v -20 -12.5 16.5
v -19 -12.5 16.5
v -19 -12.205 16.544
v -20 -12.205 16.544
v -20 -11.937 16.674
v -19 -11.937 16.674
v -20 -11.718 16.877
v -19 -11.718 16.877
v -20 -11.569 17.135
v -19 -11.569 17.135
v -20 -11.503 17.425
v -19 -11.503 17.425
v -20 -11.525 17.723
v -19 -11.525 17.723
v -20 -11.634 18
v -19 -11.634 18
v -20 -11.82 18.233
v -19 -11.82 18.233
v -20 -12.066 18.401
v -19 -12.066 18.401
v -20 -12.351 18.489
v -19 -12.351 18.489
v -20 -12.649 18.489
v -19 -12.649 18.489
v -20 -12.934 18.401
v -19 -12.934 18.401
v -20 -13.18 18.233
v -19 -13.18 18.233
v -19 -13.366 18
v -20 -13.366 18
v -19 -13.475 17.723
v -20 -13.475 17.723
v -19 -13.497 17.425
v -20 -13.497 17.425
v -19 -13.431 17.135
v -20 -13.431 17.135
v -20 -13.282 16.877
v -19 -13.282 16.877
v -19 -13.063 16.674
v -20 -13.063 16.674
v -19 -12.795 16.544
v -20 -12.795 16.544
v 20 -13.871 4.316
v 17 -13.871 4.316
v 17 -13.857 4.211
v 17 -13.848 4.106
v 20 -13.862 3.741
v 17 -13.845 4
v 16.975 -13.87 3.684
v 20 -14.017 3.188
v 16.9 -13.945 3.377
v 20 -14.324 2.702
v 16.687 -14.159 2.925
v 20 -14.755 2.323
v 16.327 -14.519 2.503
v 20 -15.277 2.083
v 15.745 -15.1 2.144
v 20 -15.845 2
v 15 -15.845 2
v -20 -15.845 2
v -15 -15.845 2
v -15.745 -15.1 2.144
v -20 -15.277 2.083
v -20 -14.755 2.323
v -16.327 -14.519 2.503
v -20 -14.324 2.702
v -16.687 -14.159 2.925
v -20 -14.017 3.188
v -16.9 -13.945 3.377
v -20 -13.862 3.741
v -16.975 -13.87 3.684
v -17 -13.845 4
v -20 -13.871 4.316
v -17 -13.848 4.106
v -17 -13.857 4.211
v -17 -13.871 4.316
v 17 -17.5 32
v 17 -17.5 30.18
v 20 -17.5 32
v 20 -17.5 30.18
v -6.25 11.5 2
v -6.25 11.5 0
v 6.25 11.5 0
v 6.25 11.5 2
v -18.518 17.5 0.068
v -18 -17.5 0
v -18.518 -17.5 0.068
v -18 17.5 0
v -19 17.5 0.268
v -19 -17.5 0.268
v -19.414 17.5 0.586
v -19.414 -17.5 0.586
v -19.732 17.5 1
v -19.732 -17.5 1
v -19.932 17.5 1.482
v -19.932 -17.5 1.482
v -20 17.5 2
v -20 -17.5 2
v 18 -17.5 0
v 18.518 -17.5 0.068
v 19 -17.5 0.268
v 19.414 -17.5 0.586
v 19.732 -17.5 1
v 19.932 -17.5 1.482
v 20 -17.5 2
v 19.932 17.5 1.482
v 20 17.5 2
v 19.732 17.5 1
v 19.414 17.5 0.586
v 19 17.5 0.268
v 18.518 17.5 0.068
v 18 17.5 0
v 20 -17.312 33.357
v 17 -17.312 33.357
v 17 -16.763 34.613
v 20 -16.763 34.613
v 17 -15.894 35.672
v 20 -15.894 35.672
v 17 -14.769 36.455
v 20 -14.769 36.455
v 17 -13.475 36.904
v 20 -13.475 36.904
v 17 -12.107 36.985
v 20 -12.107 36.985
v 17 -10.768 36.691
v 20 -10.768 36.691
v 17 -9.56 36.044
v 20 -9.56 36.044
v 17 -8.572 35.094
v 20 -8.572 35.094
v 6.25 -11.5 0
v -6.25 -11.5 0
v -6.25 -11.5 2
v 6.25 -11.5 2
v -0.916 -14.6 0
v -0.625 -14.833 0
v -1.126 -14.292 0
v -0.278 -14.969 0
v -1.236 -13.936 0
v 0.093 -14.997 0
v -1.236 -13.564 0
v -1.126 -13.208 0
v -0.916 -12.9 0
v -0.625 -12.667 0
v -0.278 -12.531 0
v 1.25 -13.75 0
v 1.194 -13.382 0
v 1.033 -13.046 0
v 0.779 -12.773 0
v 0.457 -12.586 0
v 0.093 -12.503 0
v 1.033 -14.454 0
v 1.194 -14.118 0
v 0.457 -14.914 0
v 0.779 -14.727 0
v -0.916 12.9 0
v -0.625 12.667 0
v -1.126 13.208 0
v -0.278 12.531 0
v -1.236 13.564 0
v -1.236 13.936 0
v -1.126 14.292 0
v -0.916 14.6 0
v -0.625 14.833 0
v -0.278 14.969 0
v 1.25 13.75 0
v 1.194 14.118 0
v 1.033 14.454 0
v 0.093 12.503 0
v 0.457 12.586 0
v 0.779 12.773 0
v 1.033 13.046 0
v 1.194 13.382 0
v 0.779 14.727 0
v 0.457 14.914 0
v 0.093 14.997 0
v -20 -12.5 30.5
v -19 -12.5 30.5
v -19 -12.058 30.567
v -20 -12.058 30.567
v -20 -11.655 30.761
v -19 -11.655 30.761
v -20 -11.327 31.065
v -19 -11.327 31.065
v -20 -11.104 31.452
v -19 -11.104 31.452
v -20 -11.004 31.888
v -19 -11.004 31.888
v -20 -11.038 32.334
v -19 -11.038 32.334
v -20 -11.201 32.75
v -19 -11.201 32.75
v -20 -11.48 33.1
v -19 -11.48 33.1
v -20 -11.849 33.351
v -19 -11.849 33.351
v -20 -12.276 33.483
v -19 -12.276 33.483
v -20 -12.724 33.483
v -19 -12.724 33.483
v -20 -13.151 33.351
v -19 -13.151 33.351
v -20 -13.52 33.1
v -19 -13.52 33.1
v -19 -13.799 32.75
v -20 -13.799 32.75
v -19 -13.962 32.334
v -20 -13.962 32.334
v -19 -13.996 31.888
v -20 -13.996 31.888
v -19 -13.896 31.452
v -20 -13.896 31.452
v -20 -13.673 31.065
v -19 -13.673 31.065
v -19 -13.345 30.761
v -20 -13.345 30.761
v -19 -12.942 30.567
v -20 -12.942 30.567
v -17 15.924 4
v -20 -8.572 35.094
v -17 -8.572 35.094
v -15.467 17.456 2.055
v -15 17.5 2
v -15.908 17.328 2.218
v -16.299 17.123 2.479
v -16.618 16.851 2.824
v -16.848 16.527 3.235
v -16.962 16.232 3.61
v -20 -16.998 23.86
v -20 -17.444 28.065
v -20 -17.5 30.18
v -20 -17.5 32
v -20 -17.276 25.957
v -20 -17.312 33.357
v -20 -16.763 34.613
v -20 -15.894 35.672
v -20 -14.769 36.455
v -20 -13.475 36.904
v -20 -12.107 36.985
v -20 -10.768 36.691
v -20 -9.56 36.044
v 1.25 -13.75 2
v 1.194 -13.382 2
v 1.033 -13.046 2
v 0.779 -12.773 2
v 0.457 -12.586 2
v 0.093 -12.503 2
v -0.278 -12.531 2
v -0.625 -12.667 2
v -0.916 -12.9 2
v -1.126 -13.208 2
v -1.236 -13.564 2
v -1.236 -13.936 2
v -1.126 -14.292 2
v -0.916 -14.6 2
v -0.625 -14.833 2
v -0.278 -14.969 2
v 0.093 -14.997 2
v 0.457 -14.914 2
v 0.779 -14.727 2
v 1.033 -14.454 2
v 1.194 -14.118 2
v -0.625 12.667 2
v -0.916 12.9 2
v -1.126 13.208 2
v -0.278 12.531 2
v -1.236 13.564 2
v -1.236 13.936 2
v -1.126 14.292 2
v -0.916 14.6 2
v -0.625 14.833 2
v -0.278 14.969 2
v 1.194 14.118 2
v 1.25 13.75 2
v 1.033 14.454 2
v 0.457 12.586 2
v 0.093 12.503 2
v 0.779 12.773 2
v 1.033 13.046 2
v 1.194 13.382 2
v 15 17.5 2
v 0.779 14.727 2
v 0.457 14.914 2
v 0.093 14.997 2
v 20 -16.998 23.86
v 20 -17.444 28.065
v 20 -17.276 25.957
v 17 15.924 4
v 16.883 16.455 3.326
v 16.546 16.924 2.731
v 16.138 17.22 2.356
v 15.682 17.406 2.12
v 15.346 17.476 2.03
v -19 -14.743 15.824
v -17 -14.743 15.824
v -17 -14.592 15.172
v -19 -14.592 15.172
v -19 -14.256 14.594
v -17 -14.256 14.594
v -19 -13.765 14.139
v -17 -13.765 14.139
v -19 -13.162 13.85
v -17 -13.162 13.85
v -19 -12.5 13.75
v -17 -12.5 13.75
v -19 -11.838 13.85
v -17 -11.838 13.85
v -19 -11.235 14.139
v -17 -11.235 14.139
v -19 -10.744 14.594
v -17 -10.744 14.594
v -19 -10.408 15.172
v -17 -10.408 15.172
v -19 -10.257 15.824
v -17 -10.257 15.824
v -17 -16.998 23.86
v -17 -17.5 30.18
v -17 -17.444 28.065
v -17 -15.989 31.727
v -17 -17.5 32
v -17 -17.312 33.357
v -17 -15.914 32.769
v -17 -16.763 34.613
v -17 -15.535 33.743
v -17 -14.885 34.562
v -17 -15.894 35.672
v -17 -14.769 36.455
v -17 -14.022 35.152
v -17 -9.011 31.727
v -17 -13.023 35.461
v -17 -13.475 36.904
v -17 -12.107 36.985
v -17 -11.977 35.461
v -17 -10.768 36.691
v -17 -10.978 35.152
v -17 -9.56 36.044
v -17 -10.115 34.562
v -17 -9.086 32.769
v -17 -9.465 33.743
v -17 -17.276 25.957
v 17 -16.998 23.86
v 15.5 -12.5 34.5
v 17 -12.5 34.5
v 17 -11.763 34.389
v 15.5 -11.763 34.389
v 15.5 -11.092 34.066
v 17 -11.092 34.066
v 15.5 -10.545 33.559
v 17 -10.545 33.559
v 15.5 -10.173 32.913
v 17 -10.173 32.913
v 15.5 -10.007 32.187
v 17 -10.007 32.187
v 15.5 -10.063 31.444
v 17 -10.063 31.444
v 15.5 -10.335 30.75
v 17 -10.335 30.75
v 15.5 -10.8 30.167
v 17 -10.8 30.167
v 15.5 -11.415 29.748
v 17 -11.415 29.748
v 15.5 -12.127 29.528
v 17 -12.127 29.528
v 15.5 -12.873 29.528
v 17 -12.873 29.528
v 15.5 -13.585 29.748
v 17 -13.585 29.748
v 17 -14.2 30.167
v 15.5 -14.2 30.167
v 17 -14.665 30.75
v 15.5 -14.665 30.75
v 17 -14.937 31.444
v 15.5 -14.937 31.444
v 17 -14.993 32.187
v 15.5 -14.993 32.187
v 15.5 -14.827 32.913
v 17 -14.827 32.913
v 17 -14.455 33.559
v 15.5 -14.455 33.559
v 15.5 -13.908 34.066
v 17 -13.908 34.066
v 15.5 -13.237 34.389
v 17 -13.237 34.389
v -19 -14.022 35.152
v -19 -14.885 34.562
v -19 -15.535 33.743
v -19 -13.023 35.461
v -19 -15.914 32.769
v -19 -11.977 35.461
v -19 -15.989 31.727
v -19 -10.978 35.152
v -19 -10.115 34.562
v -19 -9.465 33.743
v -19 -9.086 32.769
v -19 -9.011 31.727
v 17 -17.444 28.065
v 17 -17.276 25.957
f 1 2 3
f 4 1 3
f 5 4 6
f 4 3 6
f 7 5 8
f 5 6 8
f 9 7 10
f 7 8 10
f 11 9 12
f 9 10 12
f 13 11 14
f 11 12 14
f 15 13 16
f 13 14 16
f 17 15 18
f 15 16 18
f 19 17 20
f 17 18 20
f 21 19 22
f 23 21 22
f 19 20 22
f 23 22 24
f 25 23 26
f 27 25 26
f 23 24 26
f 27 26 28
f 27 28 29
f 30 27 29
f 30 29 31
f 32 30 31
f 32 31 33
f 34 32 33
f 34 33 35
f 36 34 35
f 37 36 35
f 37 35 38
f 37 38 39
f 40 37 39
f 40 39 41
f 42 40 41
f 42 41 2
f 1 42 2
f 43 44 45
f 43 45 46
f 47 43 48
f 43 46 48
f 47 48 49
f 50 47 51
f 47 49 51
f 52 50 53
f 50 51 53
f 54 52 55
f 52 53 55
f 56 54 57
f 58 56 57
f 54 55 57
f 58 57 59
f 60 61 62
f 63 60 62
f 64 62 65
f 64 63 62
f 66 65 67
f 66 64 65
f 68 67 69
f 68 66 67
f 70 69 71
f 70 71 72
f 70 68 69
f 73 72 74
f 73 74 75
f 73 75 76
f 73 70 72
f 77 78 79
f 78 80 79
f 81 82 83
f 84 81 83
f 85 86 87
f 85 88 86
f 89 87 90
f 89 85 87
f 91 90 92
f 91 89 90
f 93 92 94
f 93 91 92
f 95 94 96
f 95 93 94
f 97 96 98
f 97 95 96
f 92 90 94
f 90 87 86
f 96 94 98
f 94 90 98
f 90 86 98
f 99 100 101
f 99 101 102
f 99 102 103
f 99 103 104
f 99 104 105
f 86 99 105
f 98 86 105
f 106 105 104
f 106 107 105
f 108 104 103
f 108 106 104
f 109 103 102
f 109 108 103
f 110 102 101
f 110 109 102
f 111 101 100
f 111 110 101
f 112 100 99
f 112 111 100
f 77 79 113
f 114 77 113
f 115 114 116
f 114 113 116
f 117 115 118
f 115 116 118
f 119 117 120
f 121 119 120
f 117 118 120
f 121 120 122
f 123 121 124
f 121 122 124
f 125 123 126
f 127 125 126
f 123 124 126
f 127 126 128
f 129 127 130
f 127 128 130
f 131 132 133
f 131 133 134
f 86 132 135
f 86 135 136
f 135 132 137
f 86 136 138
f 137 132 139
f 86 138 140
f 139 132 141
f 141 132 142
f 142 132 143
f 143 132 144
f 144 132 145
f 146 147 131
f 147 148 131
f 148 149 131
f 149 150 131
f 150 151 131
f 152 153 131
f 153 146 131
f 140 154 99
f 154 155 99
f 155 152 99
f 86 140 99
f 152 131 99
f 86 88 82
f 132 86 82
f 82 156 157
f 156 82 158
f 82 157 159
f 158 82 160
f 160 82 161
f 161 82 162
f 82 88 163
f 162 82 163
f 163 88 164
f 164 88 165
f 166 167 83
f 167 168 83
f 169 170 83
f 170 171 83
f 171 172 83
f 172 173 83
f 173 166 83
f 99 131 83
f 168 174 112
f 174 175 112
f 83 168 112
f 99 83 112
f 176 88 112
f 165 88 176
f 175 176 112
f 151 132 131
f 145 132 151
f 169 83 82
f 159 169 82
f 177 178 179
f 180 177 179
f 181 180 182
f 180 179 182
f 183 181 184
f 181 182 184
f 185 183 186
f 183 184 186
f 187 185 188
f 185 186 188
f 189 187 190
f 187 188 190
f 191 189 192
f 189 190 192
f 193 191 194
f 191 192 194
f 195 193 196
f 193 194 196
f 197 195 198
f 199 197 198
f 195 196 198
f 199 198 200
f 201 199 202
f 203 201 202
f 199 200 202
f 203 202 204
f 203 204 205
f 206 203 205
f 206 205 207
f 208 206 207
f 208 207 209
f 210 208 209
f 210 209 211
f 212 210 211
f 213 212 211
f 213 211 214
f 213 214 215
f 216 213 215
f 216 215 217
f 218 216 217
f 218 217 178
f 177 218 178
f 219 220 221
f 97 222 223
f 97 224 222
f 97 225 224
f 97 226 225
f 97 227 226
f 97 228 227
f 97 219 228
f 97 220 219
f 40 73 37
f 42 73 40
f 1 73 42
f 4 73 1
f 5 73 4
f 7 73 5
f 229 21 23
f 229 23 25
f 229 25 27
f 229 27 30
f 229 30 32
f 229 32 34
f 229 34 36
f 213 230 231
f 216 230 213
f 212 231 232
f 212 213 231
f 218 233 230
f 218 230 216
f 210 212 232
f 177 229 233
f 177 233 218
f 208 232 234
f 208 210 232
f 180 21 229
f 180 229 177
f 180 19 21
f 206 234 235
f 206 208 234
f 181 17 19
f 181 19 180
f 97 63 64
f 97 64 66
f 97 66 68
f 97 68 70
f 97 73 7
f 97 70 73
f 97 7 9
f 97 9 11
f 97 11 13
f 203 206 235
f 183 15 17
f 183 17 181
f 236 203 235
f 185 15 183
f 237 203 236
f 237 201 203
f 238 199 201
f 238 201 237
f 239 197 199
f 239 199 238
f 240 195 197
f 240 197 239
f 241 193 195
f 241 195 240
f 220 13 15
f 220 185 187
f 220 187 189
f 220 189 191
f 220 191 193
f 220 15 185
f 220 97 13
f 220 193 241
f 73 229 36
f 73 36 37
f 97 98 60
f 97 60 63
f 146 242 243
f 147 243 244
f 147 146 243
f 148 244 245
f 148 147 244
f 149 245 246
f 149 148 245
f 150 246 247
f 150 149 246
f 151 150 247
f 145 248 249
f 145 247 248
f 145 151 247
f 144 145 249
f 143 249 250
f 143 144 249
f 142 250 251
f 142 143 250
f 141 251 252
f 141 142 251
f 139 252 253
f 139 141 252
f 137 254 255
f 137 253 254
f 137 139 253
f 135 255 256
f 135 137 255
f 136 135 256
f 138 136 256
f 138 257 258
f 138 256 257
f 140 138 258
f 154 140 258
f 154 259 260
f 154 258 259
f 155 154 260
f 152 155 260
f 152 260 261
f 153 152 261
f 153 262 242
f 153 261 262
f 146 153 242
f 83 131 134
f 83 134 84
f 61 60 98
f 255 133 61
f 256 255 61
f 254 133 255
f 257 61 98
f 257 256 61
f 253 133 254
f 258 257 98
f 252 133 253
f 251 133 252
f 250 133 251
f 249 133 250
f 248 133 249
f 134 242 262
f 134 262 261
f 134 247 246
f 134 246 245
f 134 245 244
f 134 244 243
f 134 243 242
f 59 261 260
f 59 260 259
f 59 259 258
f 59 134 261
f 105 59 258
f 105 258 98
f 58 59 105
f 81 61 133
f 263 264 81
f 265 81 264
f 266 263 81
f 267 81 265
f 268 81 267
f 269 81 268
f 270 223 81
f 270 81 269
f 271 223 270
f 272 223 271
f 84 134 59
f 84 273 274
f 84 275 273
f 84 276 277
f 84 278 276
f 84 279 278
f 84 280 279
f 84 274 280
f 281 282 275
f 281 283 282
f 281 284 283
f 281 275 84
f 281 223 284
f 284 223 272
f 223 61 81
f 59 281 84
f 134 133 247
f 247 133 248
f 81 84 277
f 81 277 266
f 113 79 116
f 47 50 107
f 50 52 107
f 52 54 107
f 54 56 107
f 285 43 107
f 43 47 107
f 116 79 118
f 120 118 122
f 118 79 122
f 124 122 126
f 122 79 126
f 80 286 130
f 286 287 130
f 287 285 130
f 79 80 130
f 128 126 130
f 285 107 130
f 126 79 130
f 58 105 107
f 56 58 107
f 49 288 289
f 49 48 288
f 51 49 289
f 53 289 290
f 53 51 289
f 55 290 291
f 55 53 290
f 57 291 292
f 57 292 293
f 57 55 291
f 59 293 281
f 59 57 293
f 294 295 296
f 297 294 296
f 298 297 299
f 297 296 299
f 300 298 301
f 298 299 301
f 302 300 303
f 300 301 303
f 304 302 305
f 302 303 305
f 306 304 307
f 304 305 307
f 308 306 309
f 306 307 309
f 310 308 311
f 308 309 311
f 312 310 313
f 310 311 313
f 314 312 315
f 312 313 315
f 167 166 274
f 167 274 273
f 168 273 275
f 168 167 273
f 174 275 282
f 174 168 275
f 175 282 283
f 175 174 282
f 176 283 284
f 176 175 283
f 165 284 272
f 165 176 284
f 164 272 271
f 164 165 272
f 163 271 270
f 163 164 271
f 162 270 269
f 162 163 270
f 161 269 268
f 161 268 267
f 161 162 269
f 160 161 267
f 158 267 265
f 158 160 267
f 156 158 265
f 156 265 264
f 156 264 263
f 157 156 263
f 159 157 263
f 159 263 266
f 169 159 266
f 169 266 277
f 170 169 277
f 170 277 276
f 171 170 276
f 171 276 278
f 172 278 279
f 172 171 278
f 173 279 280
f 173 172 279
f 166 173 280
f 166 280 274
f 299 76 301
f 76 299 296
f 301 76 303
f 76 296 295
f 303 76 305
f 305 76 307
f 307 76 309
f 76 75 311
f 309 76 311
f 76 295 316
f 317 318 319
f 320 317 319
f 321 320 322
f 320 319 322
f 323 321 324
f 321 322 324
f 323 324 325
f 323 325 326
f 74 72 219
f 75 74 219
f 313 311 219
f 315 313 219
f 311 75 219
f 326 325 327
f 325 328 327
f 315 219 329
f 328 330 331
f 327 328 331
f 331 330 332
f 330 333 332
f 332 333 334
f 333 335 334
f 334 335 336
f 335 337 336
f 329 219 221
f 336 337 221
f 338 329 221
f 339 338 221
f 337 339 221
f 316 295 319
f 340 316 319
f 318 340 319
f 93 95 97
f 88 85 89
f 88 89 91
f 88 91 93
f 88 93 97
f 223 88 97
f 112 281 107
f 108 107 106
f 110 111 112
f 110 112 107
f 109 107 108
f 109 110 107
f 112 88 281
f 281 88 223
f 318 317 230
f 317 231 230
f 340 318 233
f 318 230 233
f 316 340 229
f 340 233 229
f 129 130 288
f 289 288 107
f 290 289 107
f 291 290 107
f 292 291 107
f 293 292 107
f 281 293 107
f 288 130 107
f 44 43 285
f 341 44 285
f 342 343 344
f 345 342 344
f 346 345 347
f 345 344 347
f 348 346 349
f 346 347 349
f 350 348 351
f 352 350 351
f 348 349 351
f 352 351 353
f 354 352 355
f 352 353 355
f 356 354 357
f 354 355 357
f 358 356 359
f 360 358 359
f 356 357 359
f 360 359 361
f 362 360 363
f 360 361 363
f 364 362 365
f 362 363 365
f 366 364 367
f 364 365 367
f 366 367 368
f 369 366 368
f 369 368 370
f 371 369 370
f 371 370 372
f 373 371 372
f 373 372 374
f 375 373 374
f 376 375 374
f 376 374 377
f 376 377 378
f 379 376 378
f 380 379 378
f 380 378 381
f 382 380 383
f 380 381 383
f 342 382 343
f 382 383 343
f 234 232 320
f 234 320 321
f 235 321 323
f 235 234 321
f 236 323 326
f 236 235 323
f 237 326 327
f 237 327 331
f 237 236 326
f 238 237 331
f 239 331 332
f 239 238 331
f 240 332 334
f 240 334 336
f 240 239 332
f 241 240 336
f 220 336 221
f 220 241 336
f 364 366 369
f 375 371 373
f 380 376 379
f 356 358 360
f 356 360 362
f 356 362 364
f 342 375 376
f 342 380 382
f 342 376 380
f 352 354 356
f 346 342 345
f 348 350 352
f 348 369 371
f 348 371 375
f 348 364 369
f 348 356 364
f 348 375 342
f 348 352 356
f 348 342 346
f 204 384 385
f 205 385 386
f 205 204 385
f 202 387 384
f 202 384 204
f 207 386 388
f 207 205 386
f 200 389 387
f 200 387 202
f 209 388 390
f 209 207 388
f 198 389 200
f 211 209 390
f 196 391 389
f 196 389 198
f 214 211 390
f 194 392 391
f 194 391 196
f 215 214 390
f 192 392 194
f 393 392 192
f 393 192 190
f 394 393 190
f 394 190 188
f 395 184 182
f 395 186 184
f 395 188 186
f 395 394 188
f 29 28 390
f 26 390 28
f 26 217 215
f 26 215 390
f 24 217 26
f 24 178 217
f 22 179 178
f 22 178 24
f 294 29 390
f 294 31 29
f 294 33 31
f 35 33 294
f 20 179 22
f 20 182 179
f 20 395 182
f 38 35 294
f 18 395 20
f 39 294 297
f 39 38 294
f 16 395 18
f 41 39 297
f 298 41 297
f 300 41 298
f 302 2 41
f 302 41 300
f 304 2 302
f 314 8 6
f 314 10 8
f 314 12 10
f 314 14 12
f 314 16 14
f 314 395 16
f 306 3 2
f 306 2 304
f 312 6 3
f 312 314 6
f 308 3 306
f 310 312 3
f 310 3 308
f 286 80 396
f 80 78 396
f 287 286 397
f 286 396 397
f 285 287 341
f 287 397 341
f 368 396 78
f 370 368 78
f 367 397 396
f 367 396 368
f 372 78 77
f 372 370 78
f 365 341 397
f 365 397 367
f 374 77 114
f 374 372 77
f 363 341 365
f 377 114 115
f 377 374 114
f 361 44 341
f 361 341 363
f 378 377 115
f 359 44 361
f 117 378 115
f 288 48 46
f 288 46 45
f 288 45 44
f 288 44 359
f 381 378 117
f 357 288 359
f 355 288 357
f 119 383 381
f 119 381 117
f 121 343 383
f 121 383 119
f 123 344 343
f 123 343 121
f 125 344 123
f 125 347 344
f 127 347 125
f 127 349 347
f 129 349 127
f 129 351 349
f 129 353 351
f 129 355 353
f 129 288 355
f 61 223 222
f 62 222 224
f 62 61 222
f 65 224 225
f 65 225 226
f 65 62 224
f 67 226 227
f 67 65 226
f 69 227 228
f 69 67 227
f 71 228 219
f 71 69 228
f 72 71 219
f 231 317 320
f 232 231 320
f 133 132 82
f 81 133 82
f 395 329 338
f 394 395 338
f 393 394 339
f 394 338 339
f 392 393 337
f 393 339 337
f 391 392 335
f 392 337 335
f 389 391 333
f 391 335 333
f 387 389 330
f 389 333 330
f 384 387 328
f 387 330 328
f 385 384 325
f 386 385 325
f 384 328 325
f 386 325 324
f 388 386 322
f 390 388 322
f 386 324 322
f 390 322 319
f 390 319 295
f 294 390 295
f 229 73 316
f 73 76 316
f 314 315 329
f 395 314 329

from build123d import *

# Parameters (mm, degrees)
SKETCH_1_W          = 40
SKETCH_1_H          = 35
SKETCH_1_R          = 1.25
SKETCH_1_W_2        = 12.5
SKETCH_1_H_2        = 23
EXTRUDE_1_DEPTH     = 2
EXTRUDE_2_DEPTH     = 3
CUT_EXTRUDE_1_DEPTH = 2
SKETCH_4_R          = 2.5
EXTRUDE_3_DEPTH     = 1.5
CUT_EXTRUDE_2_DEPTH = 58.22979993
FILLET_1_R          = 40
SKETCH_6_R          = 1.5
CUT_EXTRUDE_3_DEPTH = 10
SKETCH_7_R          = 1
CUT_EXTRUDE_4_DEPTH = 10
FILLET_2_R          = 2


with BuildPart() as part:
    # 草图1 → 凸台-拉伸1 (new body)
    with BuildSketch(Plane.XY):
        Rectangle(SKETCH_1_W, SKETCH_1_H)
        with Locations((0, 13.75)):
            Circle(SKETCH_1_R, mode=Mode.SUBTRACT)
        with Locations((0, -13.75)):
            Circle(SKETCH_1_R, mode=Mode.SUBTRACT)
        Rectangle(SKETCH_1_W_2, SKETCH_1_H_2, mode=Mode.SUBTRACT)
    extrude(amount=EXTRUDE_1_DEPTH)

    # 草图2 → 凸台-拉伸2 (add)
    with BuildSketch(Plane.ZY.offset(20)):
        with BuildLine():
            Line((2, -17.5), (32, -17.5))
            ThreePointArc((32, -17.5), (36.724288943, -14.13740465), (35.094229072, -8.572437595))
            Line((35.094229072, -8.572437595), (2, 17.5))
            Line((2, 17.5), (2, -17.5))
        make_face()
    extrude_2 = extrude(amount=-EXTRUDE_2_DEPTH)

    # 草图3 → 切除-拉伸1 (cut)
    with BuildSketch(Plane(origin=(-17, 0, 0), x_dir=(0, 0, -1), z_dir=(1, 0, 0))):
        with BuildLine():
            Line((-15.82421875, -10.256876965), (-31.7265625, -9.0106975))
            ThreePointArc((-31.7265625, -9.0106975), (-35.5, -12.5), (-31.7265625, -15.9893025))
            Line((-31.7265625, -15.9893025), (-15.82421875, -14.743123035))
            ThreePointArc((-15.82421875, -14.743123035), (-13.75, -12.5), (-15.82421875, -10.256876965))
        make_face()
    extrude(amount=-CUT_EXTRUDE_1_DEPTH, mode=Mode.SUBTRACT)

    # 镜向3: 凸台-拉伸2 across plane
    add(extrude_2.mirror(Plane(origin=(0, 0, 0), x_dir=(0, 0, 1), z_dir=(1, 0, 0))))

    # 草图4 → 凸台-拉伸3 (add)
    with BuildSketch(Plane.ZY.offset(-17)):
        with Locations((32, -12.5)):
            Circle(SKETCH_4_R)
    extrude(amount=EXTRUDE_3_DEPTH)

    # 草图5 → 切除-拉伸2 (cut, through all)
    with BuildSketch(Plane(origin=(20, 0, 0), x_dir=(0, 0, -1), z_dir=(1, 0, 0))):
        Polygon((-2, -17.5), (-2, -13.5), (-27, -17.5), align=None)
    extrude(amount=-CUT_EXTRUDE_2_DEPTH, mode=Mode.SUBTRACT)

    # 圆角1
    fillet_1_edges = [part.edges().sort_by_distance(p)[0] for p in [
        (-18.5, -17.5, 27),
        (18.5, -17.5, 27),
    ]]
    fillet(fillet_1_edges, radius=FILLET_1_R)

    # 草图6 → 切除-拉伸3 (cut)
    with BuildSketch(Plane(origin=(-19, 0, 0), x_dir=(0, 0, -1), z_dir=(1, 0, 0))):
        with Locations((-32, -12.5)):
            Circle(SKETCH_6_R)
    extrude(amount=-CUT_EXTRUDE_3_DEPTH, mode=Mode.SUBTRACT)

    # 草图7 → 切除-拉伸4 (cut)
    with BuildSketch(Plane(origin=(-19, 0, 0), x_dir=(0, 0, -1), z_dir=(1, 0, 0))):
        with Locations((-17.5, -12.5)):
            Circle(SKETCH_7_R)
    extrude(amount=-CUT_EXTRUDE_4_DEPTH, mode=Mode.SUBTRACT)

    # 圆角2
    fillet_2_edges = [part.edges().sort_by_distance(p)[0] for p in [
        (17, 2, 2),
        (-17, 2, 2),
        (20, 0, 0),
        (-20, 0, 0),
        (18.5, -13.5, 2),
        (-18.5, -13.5, 2),
    ]]
    fillet(fillet_2_edges, radius=FILLET_2_R - 0.0001)  # a hair under: the kernel refuses the full size


solid = part.part
